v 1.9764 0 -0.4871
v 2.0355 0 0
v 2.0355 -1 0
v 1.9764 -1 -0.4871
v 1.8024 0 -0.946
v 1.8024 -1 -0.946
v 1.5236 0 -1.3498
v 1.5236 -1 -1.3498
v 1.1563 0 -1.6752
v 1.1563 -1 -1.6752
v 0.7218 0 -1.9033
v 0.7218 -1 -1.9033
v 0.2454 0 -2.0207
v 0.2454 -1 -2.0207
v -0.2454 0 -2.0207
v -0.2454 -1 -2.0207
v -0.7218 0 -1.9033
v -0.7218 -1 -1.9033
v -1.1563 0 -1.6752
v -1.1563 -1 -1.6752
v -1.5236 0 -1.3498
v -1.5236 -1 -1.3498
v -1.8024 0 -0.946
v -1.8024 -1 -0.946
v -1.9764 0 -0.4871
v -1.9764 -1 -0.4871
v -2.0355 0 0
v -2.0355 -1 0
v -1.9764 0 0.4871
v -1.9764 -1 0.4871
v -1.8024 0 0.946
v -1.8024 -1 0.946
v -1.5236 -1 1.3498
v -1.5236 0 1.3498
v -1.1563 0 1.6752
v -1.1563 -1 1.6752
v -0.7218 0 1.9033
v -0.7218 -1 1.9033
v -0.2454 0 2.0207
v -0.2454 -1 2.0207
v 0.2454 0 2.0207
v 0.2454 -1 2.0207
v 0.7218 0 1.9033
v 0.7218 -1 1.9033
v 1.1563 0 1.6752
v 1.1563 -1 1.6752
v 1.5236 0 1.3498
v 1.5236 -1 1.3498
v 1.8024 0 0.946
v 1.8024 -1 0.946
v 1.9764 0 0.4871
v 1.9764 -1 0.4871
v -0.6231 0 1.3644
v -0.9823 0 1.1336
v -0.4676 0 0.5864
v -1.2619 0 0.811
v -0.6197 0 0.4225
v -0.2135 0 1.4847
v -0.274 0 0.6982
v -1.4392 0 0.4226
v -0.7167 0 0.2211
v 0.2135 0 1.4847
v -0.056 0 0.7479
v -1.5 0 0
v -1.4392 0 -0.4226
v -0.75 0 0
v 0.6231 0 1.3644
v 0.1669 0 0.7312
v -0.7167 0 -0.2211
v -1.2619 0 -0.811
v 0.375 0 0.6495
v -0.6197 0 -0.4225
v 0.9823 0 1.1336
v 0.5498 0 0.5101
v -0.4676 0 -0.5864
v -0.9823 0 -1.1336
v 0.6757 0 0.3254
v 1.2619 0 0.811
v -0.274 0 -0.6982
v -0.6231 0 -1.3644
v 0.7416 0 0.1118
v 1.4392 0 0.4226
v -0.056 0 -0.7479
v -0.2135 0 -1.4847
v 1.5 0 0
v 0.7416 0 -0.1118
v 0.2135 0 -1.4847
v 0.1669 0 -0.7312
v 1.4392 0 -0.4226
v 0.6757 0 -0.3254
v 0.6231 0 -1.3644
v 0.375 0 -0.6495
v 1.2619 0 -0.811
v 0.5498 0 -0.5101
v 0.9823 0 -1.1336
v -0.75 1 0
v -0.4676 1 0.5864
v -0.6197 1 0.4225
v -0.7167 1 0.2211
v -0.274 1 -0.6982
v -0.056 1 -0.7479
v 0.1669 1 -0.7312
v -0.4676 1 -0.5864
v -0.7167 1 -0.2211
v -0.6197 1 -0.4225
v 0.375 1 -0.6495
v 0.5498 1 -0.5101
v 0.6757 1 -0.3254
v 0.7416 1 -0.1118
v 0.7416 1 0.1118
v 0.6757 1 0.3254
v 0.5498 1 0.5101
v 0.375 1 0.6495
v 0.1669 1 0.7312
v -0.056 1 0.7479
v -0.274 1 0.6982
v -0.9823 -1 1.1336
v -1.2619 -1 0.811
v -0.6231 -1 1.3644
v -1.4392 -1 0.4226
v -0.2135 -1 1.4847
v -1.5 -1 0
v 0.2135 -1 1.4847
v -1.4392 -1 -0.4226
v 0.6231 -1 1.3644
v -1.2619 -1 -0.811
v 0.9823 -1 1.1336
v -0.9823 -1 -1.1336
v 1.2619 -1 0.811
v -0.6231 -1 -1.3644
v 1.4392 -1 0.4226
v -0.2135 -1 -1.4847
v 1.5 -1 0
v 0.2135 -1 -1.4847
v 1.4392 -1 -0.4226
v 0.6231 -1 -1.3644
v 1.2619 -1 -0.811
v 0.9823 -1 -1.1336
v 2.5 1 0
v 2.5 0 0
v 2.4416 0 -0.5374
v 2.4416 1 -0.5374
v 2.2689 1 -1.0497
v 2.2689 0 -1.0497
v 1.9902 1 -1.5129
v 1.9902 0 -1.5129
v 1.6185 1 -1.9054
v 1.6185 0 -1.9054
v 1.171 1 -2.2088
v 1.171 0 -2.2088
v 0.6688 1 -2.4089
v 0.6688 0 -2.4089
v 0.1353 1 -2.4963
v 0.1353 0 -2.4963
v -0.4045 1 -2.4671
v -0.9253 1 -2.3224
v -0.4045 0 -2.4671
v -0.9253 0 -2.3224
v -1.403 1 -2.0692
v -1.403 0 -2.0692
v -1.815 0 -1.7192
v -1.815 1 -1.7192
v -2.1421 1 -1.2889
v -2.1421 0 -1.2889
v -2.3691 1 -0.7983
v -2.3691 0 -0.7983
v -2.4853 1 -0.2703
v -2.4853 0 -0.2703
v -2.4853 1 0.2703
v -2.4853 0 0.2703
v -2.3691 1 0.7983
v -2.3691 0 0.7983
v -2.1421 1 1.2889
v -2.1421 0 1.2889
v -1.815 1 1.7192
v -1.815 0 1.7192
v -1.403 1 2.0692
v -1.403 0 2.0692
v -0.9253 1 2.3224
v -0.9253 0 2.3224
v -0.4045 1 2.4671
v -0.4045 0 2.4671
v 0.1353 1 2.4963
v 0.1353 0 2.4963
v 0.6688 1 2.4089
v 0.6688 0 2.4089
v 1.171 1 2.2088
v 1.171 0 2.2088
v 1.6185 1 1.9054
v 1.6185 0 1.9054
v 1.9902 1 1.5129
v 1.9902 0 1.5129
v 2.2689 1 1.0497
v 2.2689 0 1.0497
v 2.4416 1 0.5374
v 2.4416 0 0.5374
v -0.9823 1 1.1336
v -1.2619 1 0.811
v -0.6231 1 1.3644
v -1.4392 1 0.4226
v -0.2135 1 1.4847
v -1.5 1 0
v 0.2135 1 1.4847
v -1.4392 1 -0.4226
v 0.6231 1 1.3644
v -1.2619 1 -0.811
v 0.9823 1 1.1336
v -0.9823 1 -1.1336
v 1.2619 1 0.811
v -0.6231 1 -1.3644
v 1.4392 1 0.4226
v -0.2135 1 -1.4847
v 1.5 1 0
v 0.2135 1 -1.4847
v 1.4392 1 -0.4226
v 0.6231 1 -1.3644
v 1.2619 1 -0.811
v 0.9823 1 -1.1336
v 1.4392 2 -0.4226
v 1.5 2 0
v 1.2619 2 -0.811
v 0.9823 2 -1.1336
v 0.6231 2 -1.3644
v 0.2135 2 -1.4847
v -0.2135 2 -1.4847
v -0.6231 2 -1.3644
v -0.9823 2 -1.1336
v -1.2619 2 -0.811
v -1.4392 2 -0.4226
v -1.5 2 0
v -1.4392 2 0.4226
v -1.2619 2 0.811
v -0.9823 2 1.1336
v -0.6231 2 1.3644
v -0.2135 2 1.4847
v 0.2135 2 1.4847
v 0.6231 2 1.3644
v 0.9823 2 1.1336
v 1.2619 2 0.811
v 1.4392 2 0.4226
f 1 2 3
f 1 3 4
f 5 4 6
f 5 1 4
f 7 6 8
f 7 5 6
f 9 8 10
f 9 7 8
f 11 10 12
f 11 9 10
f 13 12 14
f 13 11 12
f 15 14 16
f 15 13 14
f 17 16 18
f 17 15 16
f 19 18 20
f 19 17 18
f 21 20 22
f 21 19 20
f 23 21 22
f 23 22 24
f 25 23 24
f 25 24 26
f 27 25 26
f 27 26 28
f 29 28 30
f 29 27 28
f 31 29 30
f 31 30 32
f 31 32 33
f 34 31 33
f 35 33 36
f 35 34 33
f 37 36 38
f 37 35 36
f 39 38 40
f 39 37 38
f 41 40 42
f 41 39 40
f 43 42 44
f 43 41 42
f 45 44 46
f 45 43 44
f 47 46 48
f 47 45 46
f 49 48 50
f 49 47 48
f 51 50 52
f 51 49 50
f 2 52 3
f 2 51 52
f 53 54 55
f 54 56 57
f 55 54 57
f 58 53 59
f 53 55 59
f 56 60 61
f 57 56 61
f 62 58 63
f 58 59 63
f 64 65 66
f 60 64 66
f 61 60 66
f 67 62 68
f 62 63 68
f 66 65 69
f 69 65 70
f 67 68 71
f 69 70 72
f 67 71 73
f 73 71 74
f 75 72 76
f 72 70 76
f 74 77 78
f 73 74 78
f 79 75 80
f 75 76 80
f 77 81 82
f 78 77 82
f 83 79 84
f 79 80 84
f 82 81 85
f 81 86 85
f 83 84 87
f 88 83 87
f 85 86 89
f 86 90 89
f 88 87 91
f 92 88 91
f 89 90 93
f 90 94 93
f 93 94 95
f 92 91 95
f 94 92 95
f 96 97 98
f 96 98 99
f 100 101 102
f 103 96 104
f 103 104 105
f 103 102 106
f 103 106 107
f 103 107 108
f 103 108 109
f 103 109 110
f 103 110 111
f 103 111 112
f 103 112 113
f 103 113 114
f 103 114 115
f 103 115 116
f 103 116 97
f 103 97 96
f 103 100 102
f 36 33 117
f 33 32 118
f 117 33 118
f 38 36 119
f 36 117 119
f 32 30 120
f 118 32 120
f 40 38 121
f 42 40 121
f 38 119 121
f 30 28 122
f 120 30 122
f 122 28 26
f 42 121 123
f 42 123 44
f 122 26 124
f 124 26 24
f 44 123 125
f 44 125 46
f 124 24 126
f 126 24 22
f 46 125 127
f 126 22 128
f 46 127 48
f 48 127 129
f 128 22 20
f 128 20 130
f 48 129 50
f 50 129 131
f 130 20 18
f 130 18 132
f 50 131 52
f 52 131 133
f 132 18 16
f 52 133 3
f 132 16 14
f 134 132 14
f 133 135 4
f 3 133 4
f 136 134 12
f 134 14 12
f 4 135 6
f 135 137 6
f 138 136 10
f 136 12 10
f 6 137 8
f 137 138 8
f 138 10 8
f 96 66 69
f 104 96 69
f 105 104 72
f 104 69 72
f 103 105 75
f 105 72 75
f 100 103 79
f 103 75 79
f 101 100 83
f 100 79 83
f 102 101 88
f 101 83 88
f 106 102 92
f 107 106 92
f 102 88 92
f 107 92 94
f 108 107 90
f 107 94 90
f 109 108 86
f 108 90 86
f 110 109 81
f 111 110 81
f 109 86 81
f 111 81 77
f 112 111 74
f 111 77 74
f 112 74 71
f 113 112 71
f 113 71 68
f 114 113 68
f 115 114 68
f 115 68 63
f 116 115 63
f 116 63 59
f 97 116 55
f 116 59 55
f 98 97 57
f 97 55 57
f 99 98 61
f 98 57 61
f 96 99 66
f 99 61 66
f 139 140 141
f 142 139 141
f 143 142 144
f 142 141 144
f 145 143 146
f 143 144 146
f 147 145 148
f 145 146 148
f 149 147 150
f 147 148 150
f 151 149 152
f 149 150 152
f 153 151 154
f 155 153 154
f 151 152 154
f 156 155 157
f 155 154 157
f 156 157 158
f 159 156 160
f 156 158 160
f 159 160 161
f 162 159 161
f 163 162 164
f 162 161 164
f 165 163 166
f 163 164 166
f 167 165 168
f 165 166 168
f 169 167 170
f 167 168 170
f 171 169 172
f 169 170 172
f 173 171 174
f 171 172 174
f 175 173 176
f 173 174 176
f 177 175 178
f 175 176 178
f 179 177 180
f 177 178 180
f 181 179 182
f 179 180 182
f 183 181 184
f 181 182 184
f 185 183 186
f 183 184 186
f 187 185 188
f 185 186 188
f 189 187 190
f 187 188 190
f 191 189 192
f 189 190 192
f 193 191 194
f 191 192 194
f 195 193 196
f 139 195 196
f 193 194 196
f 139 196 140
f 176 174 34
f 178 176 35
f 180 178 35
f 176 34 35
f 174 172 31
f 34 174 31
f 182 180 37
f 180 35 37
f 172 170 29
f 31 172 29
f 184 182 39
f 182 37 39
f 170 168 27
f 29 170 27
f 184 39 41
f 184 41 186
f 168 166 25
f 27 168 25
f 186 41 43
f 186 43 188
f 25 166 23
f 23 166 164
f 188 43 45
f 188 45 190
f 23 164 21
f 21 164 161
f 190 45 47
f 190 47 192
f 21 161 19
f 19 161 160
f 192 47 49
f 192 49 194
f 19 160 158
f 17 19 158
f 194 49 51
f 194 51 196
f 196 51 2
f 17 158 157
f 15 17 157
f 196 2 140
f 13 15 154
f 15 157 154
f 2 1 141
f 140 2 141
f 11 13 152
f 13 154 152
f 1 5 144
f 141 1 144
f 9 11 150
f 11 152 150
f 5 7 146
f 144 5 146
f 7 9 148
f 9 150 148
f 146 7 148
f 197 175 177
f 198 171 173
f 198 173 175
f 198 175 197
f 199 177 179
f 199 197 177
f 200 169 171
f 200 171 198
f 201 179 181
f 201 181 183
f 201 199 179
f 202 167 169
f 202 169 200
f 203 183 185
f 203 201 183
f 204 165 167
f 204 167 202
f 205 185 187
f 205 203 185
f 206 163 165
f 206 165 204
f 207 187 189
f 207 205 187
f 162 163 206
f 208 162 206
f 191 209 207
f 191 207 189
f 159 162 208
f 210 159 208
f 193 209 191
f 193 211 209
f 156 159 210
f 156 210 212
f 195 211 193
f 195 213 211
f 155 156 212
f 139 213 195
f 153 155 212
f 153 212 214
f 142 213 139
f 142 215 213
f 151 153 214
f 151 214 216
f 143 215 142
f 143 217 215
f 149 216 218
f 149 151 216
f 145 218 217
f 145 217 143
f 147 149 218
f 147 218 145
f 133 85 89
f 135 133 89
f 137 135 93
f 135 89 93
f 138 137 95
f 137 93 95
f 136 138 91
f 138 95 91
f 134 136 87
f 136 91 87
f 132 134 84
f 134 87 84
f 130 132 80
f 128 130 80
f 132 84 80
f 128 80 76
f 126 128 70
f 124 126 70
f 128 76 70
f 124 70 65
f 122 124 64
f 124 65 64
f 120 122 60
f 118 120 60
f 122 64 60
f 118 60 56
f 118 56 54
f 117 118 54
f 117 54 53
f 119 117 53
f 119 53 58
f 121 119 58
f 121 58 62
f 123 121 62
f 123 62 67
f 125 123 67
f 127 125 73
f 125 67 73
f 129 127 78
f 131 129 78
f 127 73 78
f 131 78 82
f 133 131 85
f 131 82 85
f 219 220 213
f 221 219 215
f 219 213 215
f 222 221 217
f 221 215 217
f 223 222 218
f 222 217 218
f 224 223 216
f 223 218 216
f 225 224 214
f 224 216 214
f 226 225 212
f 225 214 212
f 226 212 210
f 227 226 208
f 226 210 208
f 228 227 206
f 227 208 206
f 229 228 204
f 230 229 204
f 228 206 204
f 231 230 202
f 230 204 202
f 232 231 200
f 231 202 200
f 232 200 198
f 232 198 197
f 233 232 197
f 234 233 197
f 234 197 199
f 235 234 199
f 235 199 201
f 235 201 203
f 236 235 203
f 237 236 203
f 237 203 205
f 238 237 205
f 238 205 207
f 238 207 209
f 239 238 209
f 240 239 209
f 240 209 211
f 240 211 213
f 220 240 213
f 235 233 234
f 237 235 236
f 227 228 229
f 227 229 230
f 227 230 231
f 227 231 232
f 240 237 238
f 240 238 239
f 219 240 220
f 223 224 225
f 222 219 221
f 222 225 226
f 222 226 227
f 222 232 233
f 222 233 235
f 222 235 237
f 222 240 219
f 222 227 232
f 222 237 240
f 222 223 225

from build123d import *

# Parameters (mm, degrees)
SKETCH1_R           = 1.5
BOSS_EXTRUDE1_DEPTH = 2
SKETCH1_3_R         = 2.035533906
SKETCH1_3_R_2       = 1.5
BOSS_EXTRUDE2_DEPTH = 1
SKETCH1_4_R         = 2.5
BOSS_EXTRUDE3_DEPTH = 1
SKETCH2_R           = 0.75
CUT_EXTRUDE1_DEPTH  = 1


with BuildPart() as part:
    # Sketch1 → Boss-Extrude1 (new body)
    with BuildSketch(Plane(origin=(0, 0, 0), x_dir=(1, 0, 0), z_dir=(0, 1, 0))):
        Circle(SKETCH1_R)
    extrude(amount=BOSS_EXTRUDE1_DEPTH)



with BuildPart() as body_2:
    # Sketch1<3> → Boss-Extrude2 (new body)
    with BuildSketch(Plane(origin=(0, 0, 0), x_dir=(1, 0, 0), z_dir=(0, 1, 0))):
        Circle(SKETCH1_3_R)
        Circle(SKETCH1_3_R_2, mode=Mode.SUBTRACT)
    extrude(amount=-BOSS_EXTRUDE2_DEPTH)


with BuildPart() as part_1:
    add(part.part)

    add(body_2.part)  # Boss-Extrude3 merges body 2
    # Sketch1<4> → Boss-Extrude3 (add)
    with BuildSketch(Plane(origin=(0, 0, 0), x_dir=(1, 0, 0), z_dir=(0, 1, 0))):
        Circle(SKETCH1_4_R)
    extrude(amount=BOSS_EXTRUDE3_DEPTH)

    # Sketch2 → Cut-Extrude1 (cut)
    with BuildSketch(Plane(origin=(0, 0, 0), x_dir=(-1, 0, 0), z_dir=(0, -1, 0))):
        Circle(SKETCH2_R)
    extrude(amount=-CUT_EXTRUDE1_DEPTH, mode=Mode.SUBTRACT)


solid = part_1.part
